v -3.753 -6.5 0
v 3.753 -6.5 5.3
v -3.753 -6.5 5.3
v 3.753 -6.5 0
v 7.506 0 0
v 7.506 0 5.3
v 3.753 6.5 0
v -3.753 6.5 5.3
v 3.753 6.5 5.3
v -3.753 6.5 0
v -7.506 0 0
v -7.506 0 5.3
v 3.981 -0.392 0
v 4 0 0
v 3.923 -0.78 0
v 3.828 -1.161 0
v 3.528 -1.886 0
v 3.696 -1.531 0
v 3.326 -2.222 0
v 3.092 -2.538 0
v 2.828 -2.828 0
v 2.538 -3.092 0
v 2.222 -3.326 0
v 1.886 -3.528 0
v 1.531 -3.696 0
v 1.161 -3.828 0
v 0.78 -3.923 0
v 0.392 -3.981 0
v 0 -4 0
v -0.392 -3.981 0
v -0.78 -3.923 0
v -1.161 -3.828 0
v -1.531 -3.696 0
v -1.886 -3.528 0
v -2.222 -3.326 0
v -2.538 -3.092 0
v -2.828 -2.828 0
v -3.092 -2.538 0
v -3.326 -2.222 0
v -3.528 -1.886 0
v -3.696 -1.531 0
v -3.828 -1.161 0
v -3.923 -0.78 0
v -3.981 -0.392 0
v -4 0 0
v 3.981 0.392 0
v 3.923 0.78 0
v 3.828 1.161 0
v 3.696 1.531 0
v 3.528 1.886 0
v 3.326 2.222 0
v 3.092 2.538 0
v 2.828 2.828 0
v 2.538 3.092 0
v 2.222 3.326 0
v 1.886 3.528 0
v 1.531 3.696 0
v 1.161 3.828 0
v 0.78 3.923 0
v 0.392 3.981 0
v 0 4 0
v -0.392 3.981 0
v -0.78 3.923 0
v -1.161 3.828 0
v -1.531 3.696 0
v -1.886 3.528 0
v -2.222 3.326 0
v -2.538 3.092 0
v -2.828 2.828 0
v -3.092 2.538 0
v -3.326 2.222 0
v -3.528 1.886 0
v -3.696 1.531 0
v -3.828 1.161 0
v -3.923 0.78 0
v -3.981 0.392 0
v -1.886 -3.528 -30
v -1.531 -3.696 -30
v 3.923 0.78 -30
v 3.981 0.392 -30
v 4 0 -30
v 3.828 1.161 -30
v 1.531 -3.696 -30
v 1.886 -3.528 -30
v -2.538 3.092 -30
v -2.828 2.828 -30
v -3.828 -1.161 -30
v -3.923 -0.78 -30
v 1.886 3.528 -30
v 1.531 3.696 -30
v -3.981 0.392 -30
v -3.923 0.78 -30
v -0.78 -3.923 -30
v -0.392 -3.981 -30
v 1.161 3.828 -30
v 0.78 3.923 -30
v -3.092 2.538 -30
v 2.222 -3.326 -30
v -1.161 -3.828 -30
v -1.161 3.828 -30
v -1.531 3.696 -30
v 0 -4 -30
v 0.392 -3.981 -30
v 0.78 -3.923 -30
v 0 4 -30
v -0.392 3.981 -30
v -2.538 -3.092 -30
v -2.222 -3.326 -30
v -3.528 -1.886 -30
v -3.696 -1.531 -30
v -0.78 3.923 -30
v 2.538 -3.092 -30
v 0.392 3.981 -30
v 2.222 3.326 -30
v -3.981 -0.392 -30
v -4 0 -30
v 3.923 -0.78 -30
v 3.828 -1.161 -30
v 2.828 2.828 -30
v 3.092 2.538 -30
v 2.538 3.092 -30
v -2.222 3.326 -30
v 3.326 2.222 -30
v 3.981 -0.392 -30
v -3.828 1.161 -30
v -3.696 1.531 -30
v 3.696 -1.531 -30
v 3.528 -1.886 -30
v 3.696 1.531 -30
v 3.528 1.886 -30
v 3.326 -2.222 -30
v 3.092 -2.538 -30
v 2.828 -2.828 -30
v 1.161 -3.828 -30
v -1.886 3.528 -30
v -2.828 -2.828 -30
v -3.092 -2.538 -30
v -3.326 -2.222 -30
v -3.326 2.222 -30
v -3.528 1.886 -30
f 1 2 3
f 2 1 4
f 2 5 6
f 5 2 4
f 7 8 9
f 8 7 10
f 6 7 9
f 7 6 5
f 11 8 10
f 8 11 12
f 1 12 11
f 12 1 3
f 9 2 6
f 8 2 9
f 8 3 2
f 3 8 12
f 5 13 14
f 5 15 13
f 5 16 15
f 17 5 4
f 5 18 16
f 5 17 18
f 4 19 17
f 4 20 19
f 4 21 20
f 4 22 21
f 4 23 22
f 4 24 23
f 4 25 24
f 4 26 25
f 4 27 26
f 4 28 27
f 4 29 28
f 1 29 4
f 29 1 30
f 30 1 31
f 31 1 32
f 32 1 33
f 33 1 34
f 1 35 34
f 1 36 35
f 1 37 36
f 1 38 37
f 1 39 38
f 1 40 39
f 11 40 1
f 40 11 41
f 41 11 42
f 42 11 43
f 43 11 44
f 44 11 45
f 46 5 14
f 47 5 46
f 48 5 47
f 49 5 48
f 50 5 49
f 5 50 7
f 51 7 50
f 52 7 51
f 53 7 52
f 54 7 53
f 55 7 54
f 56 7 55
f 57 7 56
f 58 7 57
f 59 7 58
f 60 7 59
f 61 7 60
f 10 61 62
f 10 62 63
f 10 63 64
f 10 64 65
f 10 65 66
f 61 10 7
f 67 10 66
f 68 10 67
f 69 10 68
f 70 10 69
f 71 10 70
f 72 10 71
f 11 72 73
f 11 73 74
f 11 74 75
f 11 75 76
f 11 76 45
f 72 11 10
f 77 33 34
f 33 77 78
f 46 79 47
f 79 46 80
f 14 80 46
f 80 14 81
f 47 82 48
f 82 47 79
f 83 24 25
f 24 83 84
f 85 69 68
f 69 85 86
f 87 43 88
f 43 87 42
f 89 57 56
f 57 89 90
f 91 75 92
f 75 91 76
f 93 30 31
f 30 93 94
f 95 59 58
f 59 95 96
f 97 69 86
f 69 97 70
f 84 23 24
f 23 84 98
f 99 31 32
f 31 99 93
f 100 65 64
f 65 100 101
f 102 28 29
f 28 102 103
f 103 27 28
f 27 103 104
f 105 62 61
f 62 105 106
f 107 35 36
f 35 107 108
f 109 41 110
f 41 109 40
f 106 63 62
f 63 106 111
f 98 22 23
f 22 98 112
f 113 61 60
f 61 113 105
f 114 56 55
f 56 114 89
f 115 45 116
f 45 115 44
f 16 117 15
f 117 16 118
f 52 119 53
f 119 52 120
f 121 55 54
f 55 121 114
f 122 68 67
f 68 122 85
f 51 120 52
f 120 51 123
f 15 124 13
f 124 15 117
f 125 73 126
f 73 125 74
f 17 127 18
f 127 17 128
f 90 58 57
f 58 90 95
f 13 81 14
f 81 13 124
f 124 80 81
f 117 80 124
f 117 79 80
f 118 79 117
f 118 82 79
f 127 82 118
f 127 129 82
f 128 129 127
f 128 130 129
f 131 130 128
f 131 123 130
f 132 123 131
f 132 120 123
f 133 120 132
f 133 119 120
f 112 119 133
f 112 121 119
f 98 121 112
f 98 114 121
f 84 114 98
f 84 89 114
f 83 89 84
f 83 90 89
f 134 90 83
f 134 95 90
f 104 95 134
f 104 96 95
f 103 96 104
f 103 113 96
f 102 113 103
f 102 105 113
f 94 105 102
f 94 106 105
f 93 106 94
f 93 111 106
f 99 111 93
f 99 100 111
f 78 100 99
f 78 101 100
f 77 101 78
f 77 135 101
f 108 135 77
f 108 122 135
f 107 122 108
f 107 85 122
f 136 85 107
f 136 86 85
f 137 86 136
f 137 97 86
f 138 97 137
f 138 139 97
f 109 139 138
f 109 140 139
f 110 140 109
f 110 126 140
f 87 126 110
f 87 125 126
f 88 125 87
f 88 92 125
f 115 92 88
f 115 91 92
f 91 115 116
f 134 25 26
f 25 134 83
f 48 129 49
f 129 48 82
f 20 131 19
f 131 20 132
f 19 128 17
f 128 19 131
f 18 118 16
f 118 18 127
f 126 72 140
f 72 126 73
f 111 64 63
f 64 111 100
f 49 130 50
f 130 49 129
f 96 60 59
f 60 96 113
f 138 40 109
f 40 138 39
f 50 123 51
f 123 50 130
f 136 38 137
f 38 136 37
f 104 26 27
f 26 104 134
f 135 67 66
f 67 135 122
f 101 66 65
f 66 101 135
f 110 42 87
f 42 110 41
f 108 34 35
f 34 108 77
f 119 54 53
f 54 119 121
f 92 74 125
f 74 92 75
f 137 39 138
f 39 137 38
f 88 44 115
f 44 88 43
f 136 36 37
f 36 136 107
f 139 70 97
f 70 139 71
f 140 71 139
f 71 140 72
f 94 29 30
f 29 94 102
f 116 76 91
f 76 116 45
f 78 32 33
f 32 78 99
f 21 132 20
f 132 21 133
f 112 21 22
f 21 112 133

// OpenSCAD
// M8 hex bolt (JIS/ISO style, threads omitted)

// --- Parameters ---
head_across_flats = 13;    // 対辺距離 (mm)
head_height       = 5.3;   // 頭部高さ (mm)
shank_diameter    = 8;     // シャンク直径 (mm)
shank_length      = 30;    // シャンク長さ (mm)

$fn = 64;

// 対辺距離 -> 外接円半径
head_radius = head_across_flats / sqrt(3);

module m8_hex_bolt() {
    // 頭部: 底面が z=0、+Z 方向へ
    cylinder(h = head_height, r = head_radius, $fn = 6);

    // シャンク: z=0 から -Z 方向へ
    translate([0, 0, -shank_length])
        cylinder(h = shank_length, d = shank_diameter);
}

m8_hex_bolt();
